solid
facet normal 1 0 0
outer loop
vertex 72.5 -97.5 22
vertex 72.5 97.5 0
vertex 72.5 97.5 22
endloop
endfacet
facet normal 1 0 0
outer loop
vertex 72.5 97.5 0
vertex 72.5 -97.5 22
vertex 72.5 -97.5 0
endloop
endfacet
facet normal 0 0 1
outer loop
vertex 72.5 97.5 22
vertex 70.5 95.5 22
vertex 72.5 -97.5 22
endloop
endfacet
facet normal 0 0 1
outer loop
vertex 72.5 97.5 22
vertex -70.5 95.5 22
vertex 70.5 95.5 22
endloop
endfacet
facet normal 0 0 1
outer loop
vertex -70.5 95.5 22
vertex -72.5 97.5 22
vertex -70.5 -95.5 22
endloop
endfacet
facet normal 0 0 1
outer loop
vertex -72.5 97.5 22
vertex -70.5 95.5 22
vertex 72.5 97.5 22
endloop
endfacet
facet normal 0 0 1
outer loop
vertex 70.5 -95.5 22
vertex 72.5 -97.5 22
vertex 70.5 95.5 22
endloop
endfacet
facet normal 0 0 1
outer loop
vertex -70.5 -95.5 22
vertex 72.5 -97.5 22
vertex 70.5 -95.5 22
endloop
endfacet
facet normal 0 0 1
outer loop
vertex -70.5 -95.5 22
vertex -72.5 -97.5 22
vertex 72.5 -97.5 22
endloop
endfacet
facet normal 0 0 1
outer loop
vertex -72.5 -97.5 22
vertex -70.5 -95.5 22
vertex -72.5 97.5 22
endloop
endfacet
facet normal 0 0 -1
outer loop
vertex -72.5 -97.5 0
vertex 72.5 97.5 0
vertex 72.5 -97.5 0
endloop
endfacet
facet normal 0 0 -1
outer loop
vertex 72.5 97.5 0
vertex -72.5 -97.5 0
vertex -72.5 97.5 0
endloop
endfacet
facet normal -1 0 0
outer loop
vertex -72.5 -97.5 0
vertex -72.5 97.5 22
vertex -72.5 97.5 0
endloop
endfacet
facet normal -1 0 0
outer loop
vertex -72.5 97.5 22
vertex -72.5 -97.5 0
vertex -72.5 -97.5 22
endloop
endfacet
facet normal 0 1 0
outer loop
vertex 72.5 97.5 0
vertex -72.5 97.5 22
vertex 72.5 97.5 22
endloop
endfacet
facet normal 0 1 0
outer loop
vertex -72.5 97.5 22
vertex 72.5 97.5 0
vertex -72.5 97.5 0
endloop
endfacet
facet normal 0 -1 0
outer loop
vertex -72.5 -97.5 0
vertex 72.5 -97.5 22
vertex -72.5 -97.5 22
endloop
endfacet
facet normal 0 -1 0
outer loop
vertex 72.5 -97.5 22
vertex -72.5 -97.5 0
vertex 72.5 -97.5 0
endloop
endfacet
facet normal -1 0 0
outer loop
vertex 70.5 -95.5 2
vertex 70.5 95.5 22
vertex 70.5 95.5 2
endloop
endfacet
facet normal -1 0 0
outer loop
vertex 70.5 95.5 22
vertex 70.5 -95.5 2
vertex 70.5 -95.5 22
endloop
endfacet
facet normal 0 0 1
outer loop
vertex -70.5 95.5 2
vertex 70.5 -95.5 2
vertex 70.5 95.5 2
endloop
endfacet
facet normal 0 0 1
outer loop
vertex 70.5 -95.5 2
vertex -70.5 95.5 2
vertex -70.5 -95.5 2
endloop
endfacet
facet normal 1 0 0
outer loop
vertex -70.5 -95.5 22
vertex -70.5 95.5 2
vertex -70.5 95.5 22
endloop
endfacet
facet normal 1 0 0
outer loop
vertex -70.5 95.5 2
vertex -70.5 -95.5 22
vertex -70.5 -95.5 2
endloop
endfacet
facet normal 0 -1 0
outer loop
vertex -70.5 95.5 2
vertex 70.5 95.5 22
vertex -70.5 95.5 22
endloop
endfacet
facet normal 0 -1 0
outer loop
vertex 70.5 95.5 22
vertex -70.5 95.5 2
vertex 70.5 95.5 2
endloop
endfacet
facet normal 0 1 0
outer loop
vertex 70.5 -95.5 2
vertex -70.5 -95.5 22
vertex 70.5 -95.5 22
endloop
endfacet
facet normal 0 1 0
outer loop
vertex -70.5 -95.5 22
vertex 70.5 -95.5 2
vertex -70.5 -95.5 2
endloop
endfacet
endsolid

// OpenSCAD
Smoothness = 360;
tol = 0.1;
Walls = 2;


x_Box = 145;
y_Box = 195;
z_Box = 20+Walls;


tray = 1;

module tray(){
difference(){
    translate([-x_Box/2,-y_Box/2,0])cube([x_Box, y_Box, z_Box]);
    
    translate([-x_Box/2+Walls,-y_Box/2+Walls,Walls])cube([x_Box-2*Walls, y_Box-2*Walls, z_Box]);
}
}


if (tray == 1){tray();}
